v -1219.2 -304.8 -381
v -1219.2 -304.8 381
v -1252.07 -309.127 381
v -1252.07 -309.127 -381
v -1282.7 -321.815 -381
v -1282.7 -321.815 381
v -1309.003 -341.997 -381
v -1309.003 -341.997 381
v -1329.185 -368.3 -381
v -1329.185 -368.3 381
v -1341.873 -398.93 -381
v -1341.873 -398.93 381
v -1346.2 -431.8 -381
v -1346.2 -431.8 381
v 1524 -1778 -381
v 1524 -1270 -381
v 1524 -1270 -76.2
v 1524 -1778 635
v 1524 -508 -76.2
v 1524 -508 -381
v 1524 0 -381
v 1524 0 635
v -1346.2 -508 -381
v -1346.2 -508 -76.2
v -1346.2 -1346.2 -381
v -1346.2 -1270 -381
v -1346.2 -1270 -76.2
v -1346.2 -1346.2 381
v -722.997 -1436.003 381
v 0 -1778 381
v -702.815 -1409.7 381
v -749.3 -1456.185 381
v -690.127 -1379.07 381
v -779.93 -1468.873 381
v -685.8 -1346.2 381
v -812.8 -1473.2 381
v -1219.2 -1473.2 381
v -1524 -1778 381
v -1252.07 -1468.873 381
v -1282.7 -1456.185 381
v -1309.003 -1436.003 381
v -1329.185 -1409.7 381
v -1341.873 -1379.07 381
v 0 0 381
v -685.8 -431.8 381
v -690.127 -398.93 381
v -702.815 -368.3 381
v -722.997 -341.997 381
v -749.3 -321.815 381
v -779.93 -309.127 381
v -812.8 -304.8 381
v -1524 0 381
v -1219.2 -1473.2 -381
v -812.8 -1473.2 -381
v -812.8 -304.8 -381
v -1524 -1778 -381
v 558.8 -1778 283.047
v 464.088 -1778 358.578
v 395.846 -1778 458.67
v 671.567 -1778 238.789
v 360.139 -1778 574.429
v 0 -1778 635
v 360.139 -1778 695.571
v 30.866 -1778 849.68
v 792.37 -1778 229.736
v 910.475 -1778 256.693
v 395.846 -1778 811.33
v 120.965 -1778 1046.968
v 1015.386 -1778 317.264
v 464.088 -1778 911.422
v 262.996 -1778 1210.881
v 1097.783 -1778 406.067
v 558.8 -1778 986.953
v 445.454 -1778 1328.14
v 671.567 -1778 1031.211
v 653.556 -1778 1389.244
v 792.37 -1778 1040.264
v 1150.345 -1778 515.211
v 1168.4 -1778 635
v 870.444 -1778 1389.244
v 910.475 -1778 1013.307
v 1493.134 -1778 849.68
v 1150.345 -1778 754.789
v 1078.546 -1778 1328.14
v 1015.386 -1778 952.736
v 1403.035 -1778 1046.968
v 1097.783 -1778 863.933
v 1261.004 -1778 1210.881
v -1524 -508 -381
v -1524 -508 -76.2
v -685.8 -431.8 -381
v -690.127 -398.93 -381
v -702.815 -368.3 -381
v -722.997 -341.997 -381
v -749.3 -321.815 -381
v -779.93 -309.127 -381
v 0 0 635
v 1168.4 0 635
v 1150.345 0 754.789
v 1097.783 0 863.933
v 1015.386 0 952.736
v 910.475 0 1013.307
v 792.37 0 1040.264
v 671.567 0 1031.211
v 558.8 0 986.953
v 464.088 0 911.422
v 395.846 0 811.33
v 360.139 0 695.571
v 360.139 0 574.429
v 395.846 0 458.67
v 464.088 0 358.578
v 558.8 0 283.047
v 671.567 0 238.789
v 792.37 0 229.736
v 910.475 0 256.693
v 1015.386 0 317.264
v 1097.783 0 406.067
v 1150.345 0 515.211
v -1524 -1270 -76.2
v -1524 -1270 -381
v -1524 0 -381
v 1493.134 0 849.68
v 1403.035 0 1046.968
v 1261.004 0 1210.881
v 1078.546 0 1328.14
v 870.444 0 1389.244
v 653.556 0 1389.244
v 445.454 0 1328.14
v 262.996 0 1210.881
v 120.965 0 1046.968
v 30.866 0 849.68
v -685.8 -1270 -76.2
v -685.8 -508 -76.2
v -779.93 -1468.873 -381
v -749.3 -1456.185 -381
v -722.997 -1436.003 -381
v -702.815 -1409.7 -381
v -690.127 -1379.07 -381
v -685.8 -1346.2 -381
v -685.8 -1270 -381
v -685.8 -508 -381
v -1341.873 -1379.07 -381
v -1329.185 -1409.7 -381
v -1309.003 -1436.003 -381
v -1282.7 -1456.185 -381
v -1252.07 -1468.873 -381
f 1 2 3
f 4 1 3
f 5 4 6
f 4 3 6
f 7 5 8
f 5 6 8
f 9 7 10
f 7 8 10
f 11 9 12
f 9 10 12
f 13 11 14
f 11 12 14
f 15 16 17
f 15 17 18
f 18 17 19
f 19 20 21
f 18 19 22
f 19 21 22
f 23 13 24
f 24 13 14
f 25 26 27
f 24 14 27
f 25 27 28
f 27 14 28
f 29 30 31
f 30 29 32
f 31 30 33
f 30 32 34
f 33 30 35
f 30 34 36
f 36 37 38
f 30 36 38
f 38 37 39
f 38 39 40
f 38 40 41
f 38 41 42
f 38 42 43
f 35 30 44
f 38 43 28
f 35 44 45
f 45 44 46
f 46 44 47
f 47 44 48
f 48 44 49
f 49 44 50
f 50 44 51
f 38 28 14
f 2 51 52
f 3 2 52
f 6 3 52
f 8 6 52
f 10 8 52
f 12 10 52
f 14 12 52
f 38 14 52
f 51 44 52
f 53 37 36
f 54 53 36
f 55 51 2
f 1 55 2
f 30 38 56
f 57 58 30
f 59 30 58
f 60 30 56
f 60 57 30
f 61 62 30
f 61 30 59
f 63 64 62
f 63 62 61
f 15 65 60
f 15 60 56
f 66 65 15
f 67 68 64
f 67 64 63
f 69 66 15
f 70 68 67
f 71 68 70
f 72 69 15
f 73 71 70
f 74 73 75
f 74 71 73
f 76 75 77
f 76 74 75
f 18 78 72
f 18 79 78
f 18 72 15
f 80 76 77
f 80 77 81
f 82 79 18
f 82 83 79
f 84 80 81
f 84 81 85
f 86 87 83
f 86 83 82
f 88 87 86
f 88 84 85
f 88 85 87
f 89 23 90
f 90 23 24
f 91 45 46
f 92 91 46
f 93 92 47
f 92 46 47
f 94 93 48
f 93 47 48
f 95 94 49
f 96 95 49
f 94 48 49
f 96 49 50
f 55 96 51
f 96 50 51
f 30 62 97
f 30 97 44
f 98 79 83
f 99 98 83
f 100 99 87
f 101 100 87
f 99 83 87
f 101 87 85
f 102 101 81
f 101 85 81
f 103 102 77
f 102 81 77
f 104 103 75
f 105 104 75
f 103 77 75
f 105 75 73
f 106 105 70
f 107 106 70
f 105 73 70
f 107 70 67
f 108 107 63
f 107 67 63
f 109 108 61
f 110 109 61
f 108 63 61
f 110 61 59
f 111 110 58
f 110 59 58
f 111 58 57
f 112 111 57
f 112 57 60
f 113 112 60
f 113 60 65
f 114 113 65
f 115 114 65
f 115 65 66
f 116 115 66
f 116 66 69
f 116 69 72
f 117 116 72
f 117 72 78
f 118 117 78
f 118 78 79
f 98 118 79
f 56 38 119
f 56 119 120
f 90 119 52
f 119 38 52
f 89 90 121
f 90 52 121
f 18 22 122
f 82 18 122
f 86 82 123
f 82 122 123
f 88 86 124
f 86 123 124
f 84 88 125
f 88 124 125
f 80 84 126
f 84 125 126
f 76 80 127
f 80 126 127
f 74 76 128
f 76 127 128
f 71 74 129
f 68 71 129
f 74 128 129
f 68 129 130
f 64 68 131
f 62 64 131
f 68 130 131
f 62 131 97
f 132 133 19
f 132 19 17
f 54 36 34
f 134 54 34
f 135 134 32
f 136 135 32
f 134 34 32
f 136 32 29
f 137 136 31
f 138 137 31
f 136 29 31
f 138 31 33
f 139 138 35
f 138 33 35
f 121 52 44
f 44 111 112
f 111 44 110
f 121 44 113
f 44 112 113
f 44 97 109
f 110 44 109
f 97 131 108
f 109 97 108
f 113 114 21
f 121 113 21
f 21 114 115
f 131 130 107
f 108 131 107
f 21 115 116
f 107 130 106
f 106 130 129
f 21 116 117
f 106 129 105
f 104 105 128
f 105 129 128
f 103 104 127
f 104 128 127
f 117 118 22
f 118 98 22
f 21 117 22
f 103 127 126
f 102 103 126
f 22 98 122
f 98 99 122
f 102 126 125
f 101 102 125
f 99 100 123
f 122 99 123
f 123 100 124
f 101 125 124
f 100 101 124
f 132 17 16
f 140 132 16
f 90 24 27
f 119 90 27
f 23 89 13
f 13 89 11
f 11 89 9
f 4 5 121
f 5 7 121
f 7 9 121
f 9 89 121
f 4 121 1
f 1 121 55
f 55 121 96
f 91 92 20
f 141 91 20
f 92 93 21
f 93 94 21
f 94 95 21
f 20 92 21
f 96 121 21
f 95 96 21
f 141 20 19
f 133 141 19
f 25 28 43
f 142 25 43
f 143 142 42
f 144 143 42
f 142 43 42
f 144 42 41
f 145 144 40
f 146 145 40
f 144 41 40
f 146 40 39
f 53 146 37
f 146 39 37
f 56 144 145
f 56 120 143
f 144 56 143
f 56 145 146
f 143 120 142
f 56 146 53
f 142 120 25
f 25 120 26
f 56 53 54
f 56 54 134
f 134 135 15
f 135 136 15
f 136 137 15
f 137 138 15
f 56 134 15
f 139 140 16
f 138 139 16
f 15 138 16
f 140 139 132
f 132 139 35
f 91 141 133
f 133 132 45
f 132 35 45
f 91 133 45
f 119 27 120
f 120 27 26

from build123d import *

# Parameters (mm, degrees)
F1_DEPTH = 1778
F2_R     = 406.4
F3_DEPTH = 1778.001
F5_DEPTH = 3048.001
F7_DEPTH = 762.001


with BuildPart() as f1:
    # F0 (on Front) → F1 (new body)
    with BuildSketch(Plane.XZ):
        with BuildLine():
            Line((-1524, -381), (1524, -381))
            Line((1524, -381), (1524, 127))
            Line((1524, 127), (1524, 381))
            Line((1524, 381), (1524, 635))
            ThreePointArc((1524, 635), (762, 1397), (0, 635))
            Line((0, 635), (0, 381))
            Line((0, 381), (-762, 381))
            Line((-762, 381), (-1524, 381))
            Line((-1524, 381), (-1524, -381))
        make_face()
    extrude(amount=F1_DEPTH)

    # F2 (on face) → F3 (cut, through all)
    with BuildSketch(Plane.XZ.offset(1778)):
        with Locations((762, 635)):
            Circle(F2_R)
    extrude(amount=-F3_DEPTH, mode=Mode.SUBTRACT)

    # F4 (on face) → F5 (cut, through all)
    with BuildSketch(Plane.YZ.offset(1524)):
        Polygon((-1270, -76.2), (-1270, -381), (-889, -381), (-508, -381), (-508, -76.2), align=None)
    extrude(amount=-F5_DEPTH, mode=Mode.SUBTRACT)

    # F6 (on face) → F7 (cut, through all)
    with BuildSketch(Plane.XY.offset(381)):
        with BuildLine():
            Line((-1219.2, -1473.2), (-812.8, -1473.2))
            ThreePointArc((-812.8, -1473.2), (-722.997439, -1436.002561), (-685.8, -1346.2))
            Line((-685.8, -1346.2), (-685.8, -431.8))
            ThreePointArc((-685.8, -431.8), (-722.997439, -341.997439), (-812.8, -304.8))
            Line((-812.8, -304.8), (-1219.2, -304.8))
            ThreePointArc((-1219.2, -304.8), (-1309.002561, -341.997439), (-1346.2, -431.8))
            Line((-1346.2, -431.8), (-1346.2, -1346.2))
            ThreePointArc((-1346.2, -1346.2), (-1309.002561, -1436.002561), (-1219.2, -1473.2))
        make_face()
    extrude(amount=-F7_DEPTH, mode=Mode.SUBTRACT)


solid = f1.part
